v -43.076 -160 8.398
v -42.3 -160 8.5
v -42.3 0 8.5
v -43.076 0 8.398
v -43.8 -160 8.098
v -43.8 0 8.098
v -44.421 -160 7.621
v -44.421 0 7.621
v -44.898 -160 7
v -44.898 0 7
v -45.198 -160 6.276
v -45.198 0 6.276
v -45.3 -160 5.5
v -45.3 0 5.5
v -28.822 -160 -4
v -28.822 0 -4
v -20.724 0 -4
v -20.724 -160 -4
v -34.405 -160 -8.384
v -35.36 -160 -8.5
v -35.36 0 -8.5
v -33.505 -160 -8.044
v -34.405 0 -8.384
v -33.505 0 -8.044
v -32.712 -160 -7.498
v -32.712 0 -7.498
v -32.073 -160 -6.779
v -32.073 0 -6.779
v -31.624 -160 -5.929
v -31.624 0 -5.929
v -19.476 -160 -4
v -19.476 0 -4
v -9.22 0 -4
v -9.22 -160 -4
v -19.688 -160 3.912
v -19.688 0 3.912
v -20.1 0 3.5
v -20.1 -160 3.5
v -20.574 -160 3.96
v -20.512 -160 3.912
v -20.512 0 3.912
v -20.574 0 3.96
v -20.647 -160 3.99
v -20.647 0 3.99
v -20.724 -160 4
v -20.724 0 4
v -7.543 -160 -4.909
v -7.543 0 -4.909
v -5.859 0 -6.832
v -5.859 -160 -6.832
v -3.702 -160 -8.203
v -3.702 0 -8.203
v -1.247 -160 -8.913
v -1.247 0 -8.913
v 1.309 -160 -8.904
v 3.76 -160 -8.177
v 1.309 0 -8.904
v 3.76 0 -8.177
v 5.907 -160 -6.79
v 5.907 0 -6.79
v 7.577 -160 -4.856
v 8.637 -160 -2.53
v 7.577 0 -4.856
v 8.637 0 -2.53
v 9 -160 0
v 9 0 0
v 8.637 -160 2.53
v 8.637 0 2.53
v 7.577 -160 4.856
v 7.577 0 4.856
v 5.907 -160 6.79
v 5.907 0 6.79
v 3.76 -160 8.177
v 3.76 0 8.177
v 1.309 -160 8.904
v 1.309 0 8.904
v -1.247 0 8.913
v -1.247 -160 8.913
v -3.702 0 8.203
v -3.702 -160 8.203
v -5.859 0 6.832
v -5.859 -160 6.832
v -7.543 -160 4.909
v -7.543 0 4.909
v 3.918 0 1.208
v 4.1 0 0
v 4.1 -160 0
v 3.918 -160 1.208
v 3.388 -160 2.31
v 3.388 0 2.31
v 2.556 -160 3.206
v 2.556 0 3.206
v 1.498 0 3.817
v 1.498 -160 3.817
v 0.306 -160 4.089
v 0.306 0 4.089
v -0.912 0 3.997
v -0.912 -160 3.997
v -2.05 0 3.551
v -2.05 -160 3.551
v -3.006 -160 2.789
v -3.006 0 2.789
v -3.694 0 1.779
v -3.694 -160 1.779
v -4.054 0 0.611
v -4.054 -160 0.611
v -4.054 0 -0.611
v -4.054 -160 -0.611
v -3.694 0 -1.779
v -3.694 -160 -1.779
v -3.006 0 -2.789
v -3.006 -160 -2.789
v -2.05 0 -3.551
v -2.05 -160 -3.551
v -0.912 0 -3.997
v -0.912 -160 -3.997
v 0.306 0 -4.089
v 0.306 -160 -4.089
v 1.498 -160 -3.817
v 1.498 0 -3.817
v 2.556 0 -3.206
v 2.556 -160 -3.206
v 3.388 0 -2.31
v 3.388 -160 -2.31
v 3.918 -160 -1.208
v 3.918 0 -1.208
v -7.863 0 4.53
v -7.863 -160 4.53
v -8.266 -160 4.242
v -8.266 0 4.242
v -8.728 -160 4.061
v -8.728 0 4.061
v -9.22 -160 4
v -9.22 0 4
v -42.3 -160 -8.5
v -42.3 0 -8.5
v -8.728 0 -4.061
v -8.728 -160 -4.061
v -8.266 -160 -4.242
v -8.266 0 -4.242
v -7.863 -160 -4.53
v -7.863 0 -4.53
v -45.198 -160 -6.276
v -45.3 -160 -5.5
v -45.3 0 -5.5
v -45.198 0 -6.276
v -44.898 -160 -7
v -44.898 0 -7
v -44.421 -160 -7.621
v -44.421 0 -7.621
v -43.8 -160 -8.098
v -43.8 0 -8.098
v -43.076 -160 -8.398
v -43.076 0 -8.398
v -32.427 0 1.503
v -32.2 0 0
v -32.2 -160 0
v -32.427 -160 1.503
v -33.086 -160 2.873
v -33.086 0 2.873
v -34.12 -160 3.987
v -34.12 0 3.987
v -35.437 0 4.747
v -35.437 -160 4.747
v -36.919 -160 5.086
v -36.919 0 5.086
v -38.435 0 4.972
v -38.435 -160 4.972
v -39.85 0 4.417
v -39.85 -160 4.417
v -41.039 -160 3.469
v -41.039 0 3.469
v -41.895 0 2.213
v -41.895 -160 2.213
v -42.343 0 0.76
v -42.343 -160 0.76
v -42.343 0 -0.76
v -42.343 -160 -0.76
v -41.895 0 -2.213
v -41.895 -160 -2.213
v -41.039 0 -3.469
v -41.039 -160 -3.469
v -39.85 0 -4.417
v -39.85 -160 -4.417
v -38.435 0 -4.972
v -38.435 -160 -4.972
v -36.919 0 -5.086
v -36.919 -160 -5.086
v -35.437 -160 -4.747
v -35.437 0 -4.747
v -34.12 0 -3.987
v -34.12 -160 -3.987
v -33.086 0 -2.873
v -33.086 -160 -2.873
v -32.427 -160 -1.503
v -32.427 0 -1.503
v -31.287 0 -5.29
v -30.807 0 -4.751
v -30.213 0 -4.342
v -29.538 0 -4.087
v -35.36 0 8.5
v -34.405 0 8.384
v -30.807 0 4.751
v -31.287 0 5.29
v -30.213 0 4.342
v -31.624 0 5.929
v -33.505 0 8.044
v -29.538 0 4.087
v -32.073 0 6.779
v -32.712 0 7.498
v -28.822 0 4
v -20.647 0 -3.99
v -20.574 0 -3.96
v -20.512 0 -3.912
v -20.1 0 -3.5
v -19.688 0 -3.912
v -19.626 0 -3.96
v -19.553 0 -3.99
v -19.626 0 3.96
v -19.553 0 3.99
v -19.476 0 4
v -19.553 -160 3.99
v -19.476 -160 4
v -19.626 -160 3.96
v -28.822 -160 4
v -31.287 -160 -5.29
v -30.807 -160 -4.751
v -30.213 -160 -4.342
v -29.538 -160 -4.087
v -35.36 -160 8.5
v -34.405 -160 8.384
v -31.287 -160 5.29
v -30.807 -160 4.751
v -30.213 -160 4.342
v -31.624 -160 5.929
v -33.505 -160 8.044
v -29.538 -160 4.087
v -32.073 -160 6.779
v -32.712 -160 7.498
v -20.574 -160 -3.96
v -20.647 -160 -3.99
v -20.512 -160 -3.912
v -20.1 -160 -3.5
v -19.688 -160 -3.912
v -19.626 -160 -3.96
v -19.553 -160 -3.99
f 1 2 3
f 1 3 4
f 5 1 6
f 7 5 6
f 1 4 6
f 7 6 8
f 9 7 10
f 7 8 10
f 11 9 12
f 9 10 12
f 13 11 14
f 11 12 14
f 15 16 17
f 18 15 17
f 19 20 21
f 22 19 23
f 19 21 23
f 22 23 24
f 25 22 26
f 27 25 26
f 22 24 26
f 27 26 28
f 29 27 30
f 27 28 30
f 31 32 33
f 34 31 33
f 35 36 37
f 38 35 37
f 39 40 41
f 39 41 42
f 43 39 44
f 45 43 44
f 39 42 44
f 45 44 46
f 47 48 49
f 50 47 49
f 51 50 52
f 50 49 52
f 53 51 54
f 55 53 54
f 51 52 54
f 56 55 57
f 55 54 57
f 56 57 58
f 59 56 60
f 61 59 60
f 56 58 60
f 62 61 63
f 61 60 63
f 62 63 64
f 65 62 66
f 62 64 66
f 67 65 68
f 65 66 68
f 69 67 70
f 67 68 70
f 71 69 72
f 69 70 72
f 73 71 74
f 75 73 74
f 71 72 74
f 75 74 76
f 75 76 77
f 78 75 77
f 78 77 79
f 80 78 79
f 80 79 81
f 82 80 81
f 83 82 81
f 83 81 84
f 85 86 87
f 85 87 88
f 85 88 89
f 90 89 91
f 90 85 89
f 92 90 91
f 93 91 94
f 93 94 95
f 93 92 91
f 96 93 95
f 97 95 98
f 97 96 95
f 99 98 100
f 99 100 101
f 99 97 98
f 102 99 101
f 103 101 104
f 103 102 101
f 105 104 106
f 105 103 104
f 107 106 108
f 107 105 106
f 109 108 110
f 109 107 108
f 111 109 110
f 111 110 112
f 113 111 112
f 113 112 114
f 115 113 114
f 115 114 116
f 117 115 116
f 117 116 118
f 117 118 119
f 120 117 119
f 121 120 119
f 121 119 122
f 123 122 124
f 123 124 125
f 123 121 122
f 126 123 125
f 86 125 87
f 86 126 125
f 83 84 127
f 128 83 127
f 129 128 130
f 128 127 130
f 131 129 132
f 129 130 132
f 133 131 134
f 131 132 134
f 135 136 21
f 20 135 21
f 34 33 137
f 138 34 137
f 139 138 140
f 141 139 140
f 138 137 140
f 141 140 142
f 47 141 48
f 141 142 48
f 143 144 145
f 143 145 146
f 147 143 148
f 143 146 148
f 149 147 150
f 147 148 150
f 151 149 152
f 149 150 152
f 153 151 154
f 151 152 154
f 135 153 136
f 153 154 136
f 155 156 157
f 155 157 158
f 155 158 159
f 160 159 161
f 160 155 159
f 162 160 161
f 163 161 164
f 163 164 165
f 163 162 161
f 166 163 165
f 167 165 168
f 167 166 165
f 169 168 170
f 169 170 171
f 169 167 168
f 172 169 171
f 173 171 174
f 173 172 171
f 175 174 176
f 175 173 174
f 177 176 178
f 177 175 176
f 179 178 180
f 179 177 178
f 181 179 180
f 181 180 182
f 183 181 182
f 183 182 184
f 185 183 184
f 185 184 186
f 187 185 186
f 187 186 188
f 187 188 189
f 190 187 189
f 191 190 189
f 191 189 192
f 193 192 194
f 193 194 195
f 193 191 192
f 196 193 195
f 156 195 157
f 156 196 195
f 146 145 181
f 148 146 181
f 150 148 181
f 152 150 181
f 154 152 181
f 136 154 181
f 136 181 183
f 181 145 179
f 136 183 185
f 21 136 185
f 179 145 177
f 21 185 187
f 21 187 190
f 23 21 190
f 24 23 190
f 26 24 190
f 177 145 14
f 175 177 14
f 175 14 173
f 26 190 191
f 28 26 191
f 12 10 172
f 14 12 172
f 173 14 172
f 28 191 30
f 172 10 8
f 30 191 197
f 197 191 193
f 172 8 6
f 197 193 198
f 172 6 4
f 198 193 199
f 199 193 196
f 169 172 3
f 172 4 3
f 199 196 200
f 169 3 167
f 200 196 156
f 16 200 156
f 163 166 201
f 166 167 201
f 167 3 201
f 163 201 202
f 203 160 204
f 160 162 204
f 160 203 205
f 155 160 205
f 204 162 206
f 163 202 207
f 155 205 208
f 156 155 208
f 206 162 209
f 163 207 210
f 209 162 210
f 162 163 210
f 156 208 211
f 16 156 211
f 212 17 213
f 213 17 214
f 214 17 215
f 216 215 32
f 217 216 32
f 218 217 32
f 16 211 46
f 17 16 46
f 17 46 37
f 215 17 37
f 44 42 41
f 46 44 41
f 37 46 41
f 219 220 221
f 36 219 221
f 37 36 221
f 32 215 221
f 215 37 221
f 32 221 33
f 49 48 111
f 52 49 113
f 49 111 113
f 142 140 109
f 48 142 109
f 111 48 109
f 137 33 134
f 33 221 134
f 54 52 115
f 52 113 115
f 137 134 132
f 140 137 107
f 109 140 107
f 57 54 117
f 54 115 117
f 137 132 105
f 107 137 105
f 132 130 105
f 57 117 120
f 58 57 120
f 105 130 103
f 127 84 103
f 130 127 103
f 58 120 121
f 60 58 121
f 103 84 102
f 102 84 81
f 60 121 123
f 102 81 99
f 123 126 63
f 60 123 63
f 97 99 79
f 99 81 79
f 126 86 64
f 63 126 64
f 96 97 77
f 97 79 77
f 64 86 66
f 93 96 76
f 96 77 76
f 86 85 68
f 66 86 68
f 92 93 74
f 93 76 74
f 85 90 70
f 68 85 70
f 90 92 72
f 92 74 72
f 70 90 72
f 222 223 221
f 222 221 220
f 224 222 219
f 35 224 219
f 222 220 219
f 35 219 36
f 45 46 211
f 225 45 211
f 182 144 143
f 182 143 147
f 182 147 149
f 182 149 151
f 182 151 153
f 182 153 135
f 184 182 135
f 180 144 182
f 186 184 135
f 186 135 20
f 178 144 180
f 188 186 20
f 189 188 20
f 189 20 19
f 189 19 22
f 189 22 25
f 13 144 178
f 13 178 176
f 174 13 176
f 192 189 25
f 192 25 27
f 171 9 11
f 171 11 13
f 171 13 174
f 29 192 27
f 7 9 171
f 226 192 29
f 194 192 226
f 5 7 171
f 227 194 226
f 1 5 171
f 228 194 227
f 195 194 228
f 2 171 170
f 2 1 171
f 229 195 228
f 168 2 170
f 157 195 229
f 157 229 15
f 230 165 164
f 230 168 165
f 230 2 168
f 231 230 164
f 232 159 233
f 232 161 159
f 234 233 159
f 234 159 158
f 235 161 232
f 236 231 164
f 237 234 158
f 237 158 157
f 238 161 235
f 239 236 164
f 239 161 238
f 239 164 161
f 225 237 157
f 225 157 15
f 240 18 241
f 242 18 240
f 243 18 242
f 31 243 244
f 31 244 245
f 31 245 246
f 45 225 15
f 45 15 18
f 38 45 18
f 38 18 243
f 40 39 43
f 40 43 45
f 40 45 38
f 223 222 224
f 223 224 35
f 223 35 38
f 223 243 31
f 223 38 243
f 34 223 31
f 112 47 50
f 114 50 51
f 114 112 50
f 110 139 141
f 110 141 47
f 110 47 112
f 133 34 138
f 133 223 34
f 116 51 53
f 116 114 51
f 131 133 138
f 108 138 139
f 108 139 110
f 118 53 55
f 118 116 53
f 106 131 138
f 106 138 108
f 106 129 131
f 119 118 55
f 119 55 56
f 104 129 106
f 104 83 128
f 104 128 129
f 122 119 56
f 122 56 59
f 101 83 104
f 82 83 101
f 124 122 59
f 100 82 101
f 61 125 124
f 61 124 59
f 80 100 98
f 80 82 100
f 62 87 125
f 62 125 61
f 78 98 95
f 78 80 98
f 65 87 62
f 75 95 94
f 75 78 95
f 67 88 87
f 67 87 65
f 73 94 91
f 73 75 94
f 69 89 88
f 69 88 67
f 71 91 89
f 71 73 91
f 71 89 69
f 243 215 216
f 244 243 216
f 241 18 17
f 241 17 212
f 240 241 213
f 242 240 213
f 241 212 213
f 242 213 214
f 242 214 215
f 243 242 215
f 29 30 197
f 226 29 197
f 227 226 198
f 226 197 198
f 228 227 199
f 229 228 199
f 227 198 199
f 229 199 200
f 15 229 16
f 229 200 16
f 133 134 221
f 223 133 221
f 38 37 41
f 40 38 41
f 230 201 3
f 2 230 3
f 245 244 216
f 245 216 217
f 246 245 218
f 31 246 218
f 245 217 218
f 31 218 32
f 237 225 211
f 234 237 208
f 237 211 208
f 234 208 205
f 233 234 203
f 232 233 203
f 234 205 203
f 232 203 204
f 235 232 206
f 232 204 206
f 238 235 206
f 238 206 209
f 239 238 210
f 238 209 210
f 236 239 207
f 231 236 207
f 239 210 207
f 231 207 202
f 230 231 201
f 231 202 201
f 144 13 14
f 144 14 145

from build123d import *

# Parameters (mm, degrees)
F0_R     = 5.1
F0_R_2   = 4.1
F1_DEPTH = 160


with BuildPart() as f1:
    # F0 (on Front) → F1 (new body)
    with BuildSketch(Plane.XZ):
        with BuildLine():
            ThreePointArc((-9.219544, -4), (-8.266082, -4.241902), (-7.543264, -4.909091))
            ThreePointArc((-7.543264, -4.909091), (9, 0), (-7.543264, 4.909091))
            ThreePointArc((-7.543264, 4.909091), (-8.266082, 4.241902), (-9.219544, 4))
            Line((-9.219544, 4), (-19.475736, 4))
            ThreePointArc((-19.475736, 4), (-19.590541, 3.977164), (-19.687868, 3.912132))
            Line((-19.687868, 3.912132), (-20.1, 3.5))
            Line((-20.1, 3.5), (-20.512132, 3.912132))
            ThreePointArc((-20.512132, 3.912132), (-20.609459, 3.977164), (-20.724264, 4))
            Line((-20.724264, 4), (-28.821652, 4))
            ThreePointArc((-28.821652, 4), (-30.522492, 4.528737), (-31.623801, 5.928571))
            ThreePointArc((-31.623801, 5.928571), (-33.092213, 7.795018), (-35.36, 8.5))
            Line((-35.36, 8.5), (-42.3, 8.5))
            ThreePointArc((-42.3, 8.5), (-44.42132, 7.62132), (-45.3, 5.5))
            Line((-45.3, 5.5), (-45.3, -5.5))
            ThreePointArc((-45.3, -5.5), (-44.42132, -7.62132), (-42.3, -8.5))
            Line((-42.3, -8.5), (-35.36, -8.5))
            ThreePointArc((-35.36, -8.5), (-33.092213, -7.795018), (-31.623801, -5.928571))
            ThreePointArc((-31.623801, -5.928571), (-30.522492, -4.528737), (-28.821652, -4))
            Line((-28.821652, -4), (-20.724264, -4))
            ThreePointArc((-20.724264, -4), (-20.609459, -3.977164), (-20.512132, -3.912132))
            Line((-20.512132, -3.912132), (-20.1, -3.5))
            Line((-20.1, -3.5), (-19.687868, -3.912132))
            ThreePointArc((-19.687868, -3.912132), (-19.590541, -3.977164), (-19.475736, -4))
            Line((-19.475736, -4), (-9.219544, -4))
        make_face()
        with Locations((-37.3, 0)):
            Circle(F0_R, mode=Mode.SUBTRACT)
        Circle(F0_R_2, mode=Mode.SUBTRACT)
    extrude(amount=F1_DEPTH)


solid = f1.part
